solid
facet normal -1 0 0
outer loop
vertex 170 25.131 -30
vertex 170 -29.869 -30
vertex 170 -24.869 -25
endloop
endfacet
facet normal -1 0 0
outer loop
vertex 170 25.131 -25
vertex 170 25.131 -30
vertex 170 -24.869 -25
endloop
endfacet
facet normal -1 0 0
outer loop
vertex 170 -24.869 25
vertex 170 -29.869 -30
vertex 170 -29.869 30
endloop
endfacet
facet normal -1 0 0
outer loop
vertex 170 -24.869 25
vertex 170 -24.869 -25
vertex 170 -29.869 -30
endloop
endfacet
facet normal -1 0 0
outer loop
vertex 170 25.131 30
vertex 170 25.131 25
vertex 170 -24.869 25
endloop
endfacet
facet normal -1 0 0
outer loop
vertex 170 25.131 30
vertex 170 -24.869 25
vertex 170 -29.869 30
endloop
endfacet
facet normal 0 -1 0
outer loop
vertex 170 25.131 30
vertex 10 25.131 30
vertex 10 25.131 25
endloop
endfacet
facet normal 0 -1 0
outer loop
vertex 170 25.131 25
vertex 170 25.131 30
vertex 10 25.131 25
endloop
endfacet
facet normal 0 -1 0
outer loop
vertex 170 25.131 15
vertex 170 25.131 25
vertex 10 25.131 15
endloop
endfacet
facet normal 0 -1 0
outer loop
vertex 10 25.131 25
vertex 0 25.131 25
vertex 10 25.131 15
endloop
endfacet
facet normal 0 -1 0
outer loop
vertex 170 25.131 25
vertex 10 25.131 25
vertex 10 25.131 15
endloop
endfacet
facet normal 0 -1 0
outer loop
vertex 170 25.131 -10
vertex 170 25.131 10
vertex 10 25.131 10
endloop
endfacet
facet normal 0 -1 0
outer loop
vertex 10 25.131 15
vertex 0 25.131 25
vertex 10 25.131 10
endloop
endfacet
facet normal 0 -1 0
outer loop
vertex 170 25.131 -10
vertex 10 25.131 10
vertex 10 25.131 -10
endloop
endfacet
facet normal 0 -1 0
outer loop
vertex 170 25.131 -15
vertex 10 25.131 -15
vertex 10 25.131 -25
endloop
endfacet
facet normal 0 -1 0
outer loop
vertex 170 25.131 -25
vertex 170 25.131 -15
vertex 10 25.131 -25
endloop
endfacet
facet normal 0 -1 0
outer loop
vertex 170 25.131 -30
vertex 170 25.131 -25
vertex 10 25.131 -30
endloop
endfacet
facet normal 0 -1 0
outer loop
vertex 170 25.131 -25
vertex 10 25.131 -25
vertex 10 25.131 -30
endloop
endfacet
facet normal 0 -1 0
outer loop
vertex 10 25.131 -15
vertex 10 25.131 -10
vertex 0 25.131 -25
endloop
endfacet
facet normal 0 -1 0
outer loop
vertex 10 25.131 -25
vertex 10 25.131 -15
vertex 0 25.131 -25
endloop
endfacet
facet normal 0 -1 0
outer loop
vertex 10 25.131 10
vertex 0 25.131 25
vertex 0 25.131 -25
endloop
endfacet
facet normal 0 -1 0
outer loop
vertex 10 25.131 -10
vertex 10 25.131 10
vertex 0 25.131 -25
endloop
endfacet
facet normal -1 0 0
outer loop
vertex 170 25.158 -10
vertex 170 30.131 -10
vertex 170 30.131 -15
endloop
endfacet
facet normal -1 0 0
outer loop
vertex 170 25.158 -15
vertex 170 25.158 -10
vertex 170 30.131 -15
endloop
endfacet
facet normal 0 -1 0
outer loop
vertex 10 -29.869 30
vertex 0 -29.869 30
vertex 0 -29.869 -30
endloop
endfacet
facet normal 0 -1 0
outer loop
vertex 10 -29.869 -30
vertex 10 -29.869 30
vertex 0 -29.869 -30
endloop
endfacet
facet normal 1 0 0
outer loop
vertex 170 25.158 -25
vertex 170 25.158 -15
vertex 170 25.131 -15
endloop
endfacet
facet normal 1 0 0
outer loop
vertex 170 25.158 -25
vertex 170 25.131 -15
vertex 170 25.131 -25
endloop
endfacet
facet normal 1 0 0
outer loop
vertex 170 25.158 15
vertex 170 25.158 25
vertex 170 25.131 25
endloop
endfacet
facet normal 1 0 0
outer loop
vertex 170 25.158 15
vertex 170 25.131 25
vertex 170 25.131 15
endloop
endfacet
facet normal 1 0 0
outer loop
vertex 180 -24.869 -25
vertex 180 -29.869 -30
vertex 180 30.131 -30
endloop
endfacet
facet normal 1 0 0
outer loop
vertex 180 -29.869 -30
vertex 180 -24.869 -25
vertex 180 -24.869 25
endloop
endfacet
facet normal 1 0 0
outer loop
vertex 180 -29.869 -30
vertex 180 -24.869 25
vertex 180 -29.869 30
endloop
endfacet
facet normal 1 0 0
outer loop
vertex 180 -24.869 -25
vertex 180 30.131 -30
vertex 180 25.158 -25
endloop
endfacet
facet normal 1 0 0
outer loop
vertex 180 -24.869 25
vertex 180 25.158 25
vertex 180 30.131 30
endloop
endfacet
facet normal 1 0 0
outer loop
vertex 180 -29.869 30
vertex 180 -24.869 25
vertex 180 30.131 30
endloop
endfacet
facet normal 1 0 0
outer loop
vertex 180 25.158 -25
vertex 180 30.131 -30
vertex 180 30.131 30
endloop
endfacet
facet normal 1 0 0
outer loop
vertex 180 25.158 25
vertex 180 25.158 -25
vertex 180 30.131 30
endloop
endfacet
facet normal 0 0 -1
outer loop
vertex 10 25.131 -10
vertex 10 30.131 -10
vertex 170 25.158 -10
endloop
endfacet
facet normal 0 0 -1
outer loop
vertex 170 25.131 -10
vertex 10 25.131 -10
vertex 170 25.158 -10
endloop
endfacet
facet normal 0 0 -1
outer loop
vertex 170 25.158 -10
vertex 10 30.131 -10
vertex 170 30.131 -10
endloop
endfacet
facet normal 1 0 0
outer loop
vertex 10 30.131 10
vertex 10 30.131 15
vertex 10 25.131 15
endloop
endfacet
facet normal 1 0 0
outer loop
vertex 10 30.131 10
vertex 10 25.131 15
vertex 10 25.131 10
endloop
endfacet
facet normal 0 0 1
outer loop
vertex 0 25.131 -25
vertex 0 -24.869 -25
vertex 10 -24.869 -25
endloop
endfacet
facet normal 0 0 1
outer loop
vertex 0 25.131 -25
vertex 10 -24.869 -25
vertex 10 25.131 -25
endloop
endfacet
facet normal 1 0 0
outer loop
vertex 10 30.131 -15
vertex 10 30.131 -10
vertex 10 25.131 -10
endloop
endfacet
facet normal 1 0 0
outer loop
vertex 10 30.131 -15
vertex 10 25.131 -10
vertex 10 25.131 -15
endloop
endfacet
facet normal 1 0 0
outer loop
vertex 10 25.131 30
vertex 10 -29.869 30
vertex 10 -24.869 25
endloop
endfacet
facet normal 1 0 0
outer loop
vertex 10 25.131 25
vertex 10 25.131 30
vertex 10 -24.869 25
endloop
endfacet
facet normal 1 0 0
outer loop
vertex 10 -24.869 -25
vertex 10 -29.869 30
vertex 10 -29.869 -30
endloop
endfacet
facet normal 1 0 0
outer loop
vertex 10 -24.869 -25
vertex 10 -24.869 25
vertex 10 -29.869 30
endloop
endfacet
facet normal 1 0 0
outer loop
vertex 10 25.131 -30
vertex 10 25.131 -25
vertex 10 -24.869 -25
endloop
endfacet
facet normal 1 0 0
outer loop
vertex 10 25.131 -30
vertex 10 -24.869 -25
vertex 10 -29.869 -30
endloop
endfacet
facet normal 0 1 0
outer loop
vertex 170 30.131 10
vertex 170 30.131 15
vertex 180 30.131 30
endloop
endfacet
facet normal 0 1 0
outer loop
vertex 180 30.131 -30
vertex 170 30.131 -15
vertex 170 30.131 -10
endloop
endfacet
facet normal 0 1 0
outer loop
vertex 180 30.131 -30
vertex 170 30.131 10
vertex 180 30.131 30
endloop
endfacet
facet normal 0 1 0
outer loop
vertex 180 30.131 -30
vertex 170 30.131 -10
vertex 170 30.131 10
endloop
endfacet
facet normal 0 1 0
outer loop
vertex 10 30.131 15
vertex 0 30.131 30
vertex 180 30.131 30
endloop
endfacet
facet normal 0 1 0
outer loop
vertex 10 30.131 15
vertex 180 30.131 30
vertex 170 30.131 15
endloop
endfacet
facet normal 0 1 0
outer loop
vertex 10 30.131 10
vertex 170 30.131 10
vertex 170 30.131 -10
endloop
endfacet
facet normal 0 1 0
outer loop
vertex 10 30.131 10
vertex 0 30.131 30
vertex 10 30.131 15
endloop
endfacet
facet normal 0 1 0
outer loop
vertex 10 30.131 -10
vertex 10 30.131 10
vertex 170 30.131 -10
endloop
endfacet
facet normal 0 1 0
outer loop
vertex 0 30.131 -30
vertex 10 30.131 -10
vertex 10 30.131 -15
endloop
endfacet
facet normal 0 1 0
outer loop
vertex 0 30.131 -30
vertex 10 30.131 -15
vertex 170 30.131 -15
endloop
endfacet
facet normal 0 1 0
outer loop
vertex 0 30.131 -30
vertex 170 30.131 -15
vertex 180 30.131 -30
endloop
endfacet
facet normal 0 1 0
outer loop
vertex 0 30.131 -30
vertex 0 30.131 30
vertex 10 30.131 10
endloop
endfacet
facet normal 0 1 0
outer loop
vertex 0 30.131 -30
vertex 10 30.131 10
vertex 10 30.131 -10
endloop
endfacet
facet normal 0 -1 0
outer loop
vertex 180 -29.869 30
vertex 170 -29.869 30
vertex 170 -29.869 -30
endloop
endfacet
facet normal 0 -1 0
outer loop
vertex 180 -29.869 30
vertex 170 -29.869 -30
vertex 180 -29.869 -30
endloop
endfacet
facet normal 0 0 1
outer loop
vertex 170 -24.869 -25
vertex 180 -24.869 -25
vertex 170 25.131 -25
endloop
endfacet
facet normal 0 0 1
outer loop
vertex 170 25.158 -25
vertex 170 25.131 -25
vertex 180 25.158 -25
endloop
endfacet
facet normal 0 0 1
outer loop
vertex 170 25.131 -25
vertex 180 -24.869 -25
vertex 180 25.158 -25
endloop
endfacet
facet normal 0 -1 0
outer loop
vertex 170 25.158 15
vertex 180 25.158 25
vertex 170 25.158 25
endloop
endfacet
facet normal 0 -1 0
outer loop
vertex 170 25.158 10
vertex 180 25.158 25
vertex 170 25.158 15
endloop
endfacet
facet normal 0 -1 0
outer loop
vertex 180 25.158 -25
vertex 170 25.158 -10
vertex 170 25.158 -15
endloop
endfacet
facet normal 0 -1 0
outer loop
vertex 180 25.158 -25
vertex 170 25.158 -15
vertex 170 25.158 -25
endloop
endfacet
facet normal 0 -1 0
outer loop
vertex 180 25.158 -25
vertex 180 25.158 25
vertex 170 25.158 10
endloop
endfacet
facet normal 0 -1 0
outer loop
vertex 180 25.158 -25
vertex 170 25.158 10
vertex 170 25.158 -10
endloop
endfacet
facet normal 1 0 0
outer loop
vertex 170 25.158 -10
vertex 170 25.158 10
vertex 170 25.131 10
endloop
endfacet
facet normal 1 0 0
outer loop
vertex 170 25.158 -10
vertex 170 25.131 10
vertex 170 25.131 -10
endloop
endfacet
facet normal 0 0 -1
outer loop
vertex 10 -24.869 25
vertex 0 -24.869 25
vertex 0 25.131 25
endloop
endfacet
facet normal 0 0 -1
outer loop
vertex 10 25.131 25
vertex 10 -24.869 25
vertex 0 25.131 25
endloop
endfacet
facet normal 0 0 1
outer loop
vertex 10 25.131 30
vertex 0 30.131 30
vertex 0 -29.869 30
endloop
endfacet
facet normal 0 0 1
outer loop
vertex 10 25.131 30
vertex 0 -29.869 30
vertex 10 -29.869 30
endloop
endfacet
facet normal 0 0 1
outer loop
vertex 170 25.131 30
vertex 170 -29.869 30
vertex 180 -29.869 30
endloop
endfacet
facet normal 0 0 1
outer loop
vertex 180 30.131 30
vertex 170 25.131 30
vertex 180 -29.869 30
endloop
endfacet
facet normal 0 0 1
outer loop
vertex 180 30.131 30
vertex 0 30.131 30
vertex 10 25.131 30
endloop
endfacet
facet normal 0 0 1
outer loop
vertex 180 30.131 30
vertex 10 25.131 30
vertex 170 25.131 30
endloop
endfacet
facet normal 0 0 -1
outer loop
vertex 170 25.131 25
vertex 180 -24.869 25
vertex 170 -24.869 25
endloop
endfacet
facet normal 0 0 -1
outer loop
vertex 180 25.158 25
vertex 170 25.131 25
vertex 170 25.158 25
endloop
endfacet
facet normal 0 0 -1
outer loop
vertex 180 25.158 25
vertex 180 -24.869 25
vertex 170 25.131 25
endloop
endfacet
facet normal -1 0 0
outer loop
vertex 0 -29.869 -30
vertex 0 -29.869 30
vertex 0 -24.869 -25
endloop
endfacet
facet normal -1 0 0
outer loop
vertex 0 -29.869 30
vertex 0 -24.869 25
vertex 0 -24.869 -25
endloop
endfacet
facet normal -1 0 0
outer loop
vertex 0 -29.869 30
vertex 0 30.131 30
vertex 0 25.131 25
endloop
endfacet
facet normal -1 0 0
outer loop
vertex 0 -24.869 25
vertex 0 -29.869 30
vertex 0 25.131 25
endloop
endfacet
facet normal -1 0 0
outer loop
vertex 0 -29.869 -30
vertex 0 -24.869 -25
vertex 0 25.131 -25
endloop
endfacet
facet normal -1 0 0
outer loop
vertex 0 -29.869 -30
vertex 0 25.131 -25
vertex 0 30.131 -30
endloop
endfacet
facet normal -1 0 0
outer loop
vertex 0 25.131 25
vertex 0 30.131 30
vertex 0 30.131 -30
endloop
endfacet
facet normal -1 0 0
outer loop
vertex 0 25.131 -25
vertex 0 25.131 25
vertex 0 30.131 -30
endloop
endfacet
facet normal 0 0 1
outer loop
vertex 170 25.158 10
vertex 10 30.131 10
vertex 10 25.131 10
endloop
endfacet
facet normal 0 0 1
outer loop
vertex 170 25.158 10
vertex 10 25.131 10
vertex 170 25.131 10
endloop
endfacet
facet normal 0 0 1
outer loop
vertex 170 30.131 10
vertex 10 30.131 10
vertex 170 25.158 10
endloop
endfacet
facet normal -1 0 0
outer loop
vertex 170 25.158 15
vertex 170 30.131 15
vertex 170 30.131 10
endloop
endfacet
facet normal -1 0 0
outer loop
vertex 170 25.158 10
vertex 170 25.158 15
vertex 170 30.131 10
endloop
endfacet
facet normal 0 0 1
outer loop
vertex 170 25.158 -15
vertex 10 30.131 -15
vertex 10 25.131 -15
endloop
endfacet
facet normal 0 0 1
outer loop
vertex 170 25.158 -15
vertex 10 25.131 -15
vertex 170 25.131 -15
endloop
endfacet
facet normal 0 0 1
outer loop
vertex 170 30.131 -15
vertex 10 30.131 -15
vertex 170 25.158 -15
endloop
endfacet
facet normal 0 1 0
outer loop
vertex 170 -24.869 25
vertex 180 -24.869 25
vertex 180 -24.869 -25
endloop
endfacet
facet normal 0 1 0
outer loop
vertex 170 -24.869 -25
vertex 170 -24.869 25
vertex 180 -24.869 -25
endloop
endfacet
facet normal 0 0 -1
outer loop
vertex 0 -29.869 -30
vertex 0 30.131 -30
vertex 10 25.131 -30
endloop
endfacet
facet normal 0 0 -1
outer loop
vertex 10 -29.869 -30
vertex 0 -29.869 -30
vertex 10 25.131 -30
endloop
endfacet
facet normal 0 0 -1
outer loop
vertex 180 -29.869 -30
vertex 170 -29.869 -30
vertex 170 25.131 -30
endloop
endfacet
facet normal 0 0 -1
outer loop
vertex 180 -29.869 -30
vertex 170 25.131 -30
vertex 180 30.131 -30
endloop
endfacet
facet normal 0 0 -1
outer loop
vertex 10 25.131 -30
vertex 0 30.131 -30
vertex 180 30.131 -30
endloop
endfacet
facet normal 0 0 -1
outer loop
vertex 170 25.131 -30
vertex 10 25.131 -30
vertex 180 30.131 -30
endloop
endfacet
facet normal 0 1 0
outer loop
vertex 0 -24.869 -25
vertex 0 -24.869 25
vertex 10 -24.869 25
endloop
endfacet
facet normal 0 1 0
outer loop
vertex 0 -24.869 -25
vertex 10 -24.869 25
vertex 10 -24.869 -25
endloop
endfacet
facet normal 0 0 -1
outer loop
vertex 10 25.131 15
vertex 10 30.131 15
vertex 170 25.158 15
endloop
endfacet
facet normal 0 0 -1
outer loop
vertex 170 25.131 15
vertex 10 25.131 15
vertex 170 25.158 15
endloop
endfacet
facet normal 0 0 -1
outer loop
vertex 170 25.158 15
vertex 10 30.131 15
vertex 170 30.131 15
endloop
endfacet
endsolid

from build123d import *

# Parameters (mm, degrees)
CROQUIS2_W              = 60
CROQUIS2_H              = 60
CROQUIS2_W_2            = 50
CROQUIS2_H_2            = 50
SALIENTE_EXTRUIR1_DEPTH = 10
CROQUIS3_W              = 60
CROQUIS3_H              = 5
SALIENTE_EXTRUIR2_DEPTH = 170
CROQUIS5_W              = 10
CROQUIS5_H              = 60
SALIENTE_EXTRUIR3_DEPTH = 55
CROQUIS7_W              = 50
CROQUIS7_H              = 50.027491106
CORTAR_EXTRUIR1_DEPTH   = 10
CROQUIS8_W              = 160
CROQUIS8_H              = 5
CORTAR_EXTRUIR2_DEPTH   = 10


with BuildPart() as part:
    # Croquis2 → Saliente-Extruir1 (new body)
    with BuildSketch(Plane(origin=(0, 0, 0), x_dir=(0, 0, -1), z_dir=(1, 0, 0))):
        with Locations((0, 0.130518683)):
            Rectangle(CROQUIS2_W, CROQUIS2_H)
        with Locations((0, 0.130518683)):
            Rectangle(CROQUIS2_W_2, CROQUIS2_H_2, mode=Mode.SUBTRACT)
    extrude(amount=SALIENTE_EXTRUIR1_DEPTH)

    # Croquis3 → Saliente-Extruir2 (add)
    with BuildSketch(Plane(origin=(10, 0, 0), x_dir=(0, 0, -1), z_dir=(1, 0, 0))):
        with Locations((0, 27.630518683)):
            Rectangle(CROQUIS3_W, CROQUIS3_H)
    extrude(amount=SALIENTE_EXTRUIR2_DEPTH)

    # Croquis5 → Saliente-Extruir3 (add)
    with BuildSketch(Plane.XZ.offset(-25.130518683)):
        with Locations((175, 0)):
            Rectangle(CROQUIS5_W, CROQUIS5_H)
    extrude(amount=SALIENTE_EXTRUIR3_DEPTH)

    # Croquis7 → Cortar-Extruir1 (cut)
    with BuildSketch(Plane(origin=(180, 0, 0), x_dir=(0, 0, -1), z_dir=(1, 0, 0))):
        with Locations((0, 0.144264236)):
            Rectangle(CROQUIS7_W, CROQUIS7_H)
    extrude(amount=-CORTAR_EXTRUIR1_DEPTH, mode=Mode.SUBTRACT)

    # Croquis8 → Cortar-Extruir2 (cut)
    with BuildSketch(Plane(origin=(0, 30.130518683, 0), x_dir=(1, 0, 0), z_dir=(0, 1, 0))):
        with Locations((90, 12.5)):
            Rectangle(CROQUIS8_W, CROQUIS8_H)
        with Locations((90, -12.5)):
            Rectangle(CROQUIS8_W, CROQUIS8_H)
    extrude(amount=-CORTAR_EXTRUIR2_DEPTH, mode=Mode.SUBTRACT)


solid = part.part
